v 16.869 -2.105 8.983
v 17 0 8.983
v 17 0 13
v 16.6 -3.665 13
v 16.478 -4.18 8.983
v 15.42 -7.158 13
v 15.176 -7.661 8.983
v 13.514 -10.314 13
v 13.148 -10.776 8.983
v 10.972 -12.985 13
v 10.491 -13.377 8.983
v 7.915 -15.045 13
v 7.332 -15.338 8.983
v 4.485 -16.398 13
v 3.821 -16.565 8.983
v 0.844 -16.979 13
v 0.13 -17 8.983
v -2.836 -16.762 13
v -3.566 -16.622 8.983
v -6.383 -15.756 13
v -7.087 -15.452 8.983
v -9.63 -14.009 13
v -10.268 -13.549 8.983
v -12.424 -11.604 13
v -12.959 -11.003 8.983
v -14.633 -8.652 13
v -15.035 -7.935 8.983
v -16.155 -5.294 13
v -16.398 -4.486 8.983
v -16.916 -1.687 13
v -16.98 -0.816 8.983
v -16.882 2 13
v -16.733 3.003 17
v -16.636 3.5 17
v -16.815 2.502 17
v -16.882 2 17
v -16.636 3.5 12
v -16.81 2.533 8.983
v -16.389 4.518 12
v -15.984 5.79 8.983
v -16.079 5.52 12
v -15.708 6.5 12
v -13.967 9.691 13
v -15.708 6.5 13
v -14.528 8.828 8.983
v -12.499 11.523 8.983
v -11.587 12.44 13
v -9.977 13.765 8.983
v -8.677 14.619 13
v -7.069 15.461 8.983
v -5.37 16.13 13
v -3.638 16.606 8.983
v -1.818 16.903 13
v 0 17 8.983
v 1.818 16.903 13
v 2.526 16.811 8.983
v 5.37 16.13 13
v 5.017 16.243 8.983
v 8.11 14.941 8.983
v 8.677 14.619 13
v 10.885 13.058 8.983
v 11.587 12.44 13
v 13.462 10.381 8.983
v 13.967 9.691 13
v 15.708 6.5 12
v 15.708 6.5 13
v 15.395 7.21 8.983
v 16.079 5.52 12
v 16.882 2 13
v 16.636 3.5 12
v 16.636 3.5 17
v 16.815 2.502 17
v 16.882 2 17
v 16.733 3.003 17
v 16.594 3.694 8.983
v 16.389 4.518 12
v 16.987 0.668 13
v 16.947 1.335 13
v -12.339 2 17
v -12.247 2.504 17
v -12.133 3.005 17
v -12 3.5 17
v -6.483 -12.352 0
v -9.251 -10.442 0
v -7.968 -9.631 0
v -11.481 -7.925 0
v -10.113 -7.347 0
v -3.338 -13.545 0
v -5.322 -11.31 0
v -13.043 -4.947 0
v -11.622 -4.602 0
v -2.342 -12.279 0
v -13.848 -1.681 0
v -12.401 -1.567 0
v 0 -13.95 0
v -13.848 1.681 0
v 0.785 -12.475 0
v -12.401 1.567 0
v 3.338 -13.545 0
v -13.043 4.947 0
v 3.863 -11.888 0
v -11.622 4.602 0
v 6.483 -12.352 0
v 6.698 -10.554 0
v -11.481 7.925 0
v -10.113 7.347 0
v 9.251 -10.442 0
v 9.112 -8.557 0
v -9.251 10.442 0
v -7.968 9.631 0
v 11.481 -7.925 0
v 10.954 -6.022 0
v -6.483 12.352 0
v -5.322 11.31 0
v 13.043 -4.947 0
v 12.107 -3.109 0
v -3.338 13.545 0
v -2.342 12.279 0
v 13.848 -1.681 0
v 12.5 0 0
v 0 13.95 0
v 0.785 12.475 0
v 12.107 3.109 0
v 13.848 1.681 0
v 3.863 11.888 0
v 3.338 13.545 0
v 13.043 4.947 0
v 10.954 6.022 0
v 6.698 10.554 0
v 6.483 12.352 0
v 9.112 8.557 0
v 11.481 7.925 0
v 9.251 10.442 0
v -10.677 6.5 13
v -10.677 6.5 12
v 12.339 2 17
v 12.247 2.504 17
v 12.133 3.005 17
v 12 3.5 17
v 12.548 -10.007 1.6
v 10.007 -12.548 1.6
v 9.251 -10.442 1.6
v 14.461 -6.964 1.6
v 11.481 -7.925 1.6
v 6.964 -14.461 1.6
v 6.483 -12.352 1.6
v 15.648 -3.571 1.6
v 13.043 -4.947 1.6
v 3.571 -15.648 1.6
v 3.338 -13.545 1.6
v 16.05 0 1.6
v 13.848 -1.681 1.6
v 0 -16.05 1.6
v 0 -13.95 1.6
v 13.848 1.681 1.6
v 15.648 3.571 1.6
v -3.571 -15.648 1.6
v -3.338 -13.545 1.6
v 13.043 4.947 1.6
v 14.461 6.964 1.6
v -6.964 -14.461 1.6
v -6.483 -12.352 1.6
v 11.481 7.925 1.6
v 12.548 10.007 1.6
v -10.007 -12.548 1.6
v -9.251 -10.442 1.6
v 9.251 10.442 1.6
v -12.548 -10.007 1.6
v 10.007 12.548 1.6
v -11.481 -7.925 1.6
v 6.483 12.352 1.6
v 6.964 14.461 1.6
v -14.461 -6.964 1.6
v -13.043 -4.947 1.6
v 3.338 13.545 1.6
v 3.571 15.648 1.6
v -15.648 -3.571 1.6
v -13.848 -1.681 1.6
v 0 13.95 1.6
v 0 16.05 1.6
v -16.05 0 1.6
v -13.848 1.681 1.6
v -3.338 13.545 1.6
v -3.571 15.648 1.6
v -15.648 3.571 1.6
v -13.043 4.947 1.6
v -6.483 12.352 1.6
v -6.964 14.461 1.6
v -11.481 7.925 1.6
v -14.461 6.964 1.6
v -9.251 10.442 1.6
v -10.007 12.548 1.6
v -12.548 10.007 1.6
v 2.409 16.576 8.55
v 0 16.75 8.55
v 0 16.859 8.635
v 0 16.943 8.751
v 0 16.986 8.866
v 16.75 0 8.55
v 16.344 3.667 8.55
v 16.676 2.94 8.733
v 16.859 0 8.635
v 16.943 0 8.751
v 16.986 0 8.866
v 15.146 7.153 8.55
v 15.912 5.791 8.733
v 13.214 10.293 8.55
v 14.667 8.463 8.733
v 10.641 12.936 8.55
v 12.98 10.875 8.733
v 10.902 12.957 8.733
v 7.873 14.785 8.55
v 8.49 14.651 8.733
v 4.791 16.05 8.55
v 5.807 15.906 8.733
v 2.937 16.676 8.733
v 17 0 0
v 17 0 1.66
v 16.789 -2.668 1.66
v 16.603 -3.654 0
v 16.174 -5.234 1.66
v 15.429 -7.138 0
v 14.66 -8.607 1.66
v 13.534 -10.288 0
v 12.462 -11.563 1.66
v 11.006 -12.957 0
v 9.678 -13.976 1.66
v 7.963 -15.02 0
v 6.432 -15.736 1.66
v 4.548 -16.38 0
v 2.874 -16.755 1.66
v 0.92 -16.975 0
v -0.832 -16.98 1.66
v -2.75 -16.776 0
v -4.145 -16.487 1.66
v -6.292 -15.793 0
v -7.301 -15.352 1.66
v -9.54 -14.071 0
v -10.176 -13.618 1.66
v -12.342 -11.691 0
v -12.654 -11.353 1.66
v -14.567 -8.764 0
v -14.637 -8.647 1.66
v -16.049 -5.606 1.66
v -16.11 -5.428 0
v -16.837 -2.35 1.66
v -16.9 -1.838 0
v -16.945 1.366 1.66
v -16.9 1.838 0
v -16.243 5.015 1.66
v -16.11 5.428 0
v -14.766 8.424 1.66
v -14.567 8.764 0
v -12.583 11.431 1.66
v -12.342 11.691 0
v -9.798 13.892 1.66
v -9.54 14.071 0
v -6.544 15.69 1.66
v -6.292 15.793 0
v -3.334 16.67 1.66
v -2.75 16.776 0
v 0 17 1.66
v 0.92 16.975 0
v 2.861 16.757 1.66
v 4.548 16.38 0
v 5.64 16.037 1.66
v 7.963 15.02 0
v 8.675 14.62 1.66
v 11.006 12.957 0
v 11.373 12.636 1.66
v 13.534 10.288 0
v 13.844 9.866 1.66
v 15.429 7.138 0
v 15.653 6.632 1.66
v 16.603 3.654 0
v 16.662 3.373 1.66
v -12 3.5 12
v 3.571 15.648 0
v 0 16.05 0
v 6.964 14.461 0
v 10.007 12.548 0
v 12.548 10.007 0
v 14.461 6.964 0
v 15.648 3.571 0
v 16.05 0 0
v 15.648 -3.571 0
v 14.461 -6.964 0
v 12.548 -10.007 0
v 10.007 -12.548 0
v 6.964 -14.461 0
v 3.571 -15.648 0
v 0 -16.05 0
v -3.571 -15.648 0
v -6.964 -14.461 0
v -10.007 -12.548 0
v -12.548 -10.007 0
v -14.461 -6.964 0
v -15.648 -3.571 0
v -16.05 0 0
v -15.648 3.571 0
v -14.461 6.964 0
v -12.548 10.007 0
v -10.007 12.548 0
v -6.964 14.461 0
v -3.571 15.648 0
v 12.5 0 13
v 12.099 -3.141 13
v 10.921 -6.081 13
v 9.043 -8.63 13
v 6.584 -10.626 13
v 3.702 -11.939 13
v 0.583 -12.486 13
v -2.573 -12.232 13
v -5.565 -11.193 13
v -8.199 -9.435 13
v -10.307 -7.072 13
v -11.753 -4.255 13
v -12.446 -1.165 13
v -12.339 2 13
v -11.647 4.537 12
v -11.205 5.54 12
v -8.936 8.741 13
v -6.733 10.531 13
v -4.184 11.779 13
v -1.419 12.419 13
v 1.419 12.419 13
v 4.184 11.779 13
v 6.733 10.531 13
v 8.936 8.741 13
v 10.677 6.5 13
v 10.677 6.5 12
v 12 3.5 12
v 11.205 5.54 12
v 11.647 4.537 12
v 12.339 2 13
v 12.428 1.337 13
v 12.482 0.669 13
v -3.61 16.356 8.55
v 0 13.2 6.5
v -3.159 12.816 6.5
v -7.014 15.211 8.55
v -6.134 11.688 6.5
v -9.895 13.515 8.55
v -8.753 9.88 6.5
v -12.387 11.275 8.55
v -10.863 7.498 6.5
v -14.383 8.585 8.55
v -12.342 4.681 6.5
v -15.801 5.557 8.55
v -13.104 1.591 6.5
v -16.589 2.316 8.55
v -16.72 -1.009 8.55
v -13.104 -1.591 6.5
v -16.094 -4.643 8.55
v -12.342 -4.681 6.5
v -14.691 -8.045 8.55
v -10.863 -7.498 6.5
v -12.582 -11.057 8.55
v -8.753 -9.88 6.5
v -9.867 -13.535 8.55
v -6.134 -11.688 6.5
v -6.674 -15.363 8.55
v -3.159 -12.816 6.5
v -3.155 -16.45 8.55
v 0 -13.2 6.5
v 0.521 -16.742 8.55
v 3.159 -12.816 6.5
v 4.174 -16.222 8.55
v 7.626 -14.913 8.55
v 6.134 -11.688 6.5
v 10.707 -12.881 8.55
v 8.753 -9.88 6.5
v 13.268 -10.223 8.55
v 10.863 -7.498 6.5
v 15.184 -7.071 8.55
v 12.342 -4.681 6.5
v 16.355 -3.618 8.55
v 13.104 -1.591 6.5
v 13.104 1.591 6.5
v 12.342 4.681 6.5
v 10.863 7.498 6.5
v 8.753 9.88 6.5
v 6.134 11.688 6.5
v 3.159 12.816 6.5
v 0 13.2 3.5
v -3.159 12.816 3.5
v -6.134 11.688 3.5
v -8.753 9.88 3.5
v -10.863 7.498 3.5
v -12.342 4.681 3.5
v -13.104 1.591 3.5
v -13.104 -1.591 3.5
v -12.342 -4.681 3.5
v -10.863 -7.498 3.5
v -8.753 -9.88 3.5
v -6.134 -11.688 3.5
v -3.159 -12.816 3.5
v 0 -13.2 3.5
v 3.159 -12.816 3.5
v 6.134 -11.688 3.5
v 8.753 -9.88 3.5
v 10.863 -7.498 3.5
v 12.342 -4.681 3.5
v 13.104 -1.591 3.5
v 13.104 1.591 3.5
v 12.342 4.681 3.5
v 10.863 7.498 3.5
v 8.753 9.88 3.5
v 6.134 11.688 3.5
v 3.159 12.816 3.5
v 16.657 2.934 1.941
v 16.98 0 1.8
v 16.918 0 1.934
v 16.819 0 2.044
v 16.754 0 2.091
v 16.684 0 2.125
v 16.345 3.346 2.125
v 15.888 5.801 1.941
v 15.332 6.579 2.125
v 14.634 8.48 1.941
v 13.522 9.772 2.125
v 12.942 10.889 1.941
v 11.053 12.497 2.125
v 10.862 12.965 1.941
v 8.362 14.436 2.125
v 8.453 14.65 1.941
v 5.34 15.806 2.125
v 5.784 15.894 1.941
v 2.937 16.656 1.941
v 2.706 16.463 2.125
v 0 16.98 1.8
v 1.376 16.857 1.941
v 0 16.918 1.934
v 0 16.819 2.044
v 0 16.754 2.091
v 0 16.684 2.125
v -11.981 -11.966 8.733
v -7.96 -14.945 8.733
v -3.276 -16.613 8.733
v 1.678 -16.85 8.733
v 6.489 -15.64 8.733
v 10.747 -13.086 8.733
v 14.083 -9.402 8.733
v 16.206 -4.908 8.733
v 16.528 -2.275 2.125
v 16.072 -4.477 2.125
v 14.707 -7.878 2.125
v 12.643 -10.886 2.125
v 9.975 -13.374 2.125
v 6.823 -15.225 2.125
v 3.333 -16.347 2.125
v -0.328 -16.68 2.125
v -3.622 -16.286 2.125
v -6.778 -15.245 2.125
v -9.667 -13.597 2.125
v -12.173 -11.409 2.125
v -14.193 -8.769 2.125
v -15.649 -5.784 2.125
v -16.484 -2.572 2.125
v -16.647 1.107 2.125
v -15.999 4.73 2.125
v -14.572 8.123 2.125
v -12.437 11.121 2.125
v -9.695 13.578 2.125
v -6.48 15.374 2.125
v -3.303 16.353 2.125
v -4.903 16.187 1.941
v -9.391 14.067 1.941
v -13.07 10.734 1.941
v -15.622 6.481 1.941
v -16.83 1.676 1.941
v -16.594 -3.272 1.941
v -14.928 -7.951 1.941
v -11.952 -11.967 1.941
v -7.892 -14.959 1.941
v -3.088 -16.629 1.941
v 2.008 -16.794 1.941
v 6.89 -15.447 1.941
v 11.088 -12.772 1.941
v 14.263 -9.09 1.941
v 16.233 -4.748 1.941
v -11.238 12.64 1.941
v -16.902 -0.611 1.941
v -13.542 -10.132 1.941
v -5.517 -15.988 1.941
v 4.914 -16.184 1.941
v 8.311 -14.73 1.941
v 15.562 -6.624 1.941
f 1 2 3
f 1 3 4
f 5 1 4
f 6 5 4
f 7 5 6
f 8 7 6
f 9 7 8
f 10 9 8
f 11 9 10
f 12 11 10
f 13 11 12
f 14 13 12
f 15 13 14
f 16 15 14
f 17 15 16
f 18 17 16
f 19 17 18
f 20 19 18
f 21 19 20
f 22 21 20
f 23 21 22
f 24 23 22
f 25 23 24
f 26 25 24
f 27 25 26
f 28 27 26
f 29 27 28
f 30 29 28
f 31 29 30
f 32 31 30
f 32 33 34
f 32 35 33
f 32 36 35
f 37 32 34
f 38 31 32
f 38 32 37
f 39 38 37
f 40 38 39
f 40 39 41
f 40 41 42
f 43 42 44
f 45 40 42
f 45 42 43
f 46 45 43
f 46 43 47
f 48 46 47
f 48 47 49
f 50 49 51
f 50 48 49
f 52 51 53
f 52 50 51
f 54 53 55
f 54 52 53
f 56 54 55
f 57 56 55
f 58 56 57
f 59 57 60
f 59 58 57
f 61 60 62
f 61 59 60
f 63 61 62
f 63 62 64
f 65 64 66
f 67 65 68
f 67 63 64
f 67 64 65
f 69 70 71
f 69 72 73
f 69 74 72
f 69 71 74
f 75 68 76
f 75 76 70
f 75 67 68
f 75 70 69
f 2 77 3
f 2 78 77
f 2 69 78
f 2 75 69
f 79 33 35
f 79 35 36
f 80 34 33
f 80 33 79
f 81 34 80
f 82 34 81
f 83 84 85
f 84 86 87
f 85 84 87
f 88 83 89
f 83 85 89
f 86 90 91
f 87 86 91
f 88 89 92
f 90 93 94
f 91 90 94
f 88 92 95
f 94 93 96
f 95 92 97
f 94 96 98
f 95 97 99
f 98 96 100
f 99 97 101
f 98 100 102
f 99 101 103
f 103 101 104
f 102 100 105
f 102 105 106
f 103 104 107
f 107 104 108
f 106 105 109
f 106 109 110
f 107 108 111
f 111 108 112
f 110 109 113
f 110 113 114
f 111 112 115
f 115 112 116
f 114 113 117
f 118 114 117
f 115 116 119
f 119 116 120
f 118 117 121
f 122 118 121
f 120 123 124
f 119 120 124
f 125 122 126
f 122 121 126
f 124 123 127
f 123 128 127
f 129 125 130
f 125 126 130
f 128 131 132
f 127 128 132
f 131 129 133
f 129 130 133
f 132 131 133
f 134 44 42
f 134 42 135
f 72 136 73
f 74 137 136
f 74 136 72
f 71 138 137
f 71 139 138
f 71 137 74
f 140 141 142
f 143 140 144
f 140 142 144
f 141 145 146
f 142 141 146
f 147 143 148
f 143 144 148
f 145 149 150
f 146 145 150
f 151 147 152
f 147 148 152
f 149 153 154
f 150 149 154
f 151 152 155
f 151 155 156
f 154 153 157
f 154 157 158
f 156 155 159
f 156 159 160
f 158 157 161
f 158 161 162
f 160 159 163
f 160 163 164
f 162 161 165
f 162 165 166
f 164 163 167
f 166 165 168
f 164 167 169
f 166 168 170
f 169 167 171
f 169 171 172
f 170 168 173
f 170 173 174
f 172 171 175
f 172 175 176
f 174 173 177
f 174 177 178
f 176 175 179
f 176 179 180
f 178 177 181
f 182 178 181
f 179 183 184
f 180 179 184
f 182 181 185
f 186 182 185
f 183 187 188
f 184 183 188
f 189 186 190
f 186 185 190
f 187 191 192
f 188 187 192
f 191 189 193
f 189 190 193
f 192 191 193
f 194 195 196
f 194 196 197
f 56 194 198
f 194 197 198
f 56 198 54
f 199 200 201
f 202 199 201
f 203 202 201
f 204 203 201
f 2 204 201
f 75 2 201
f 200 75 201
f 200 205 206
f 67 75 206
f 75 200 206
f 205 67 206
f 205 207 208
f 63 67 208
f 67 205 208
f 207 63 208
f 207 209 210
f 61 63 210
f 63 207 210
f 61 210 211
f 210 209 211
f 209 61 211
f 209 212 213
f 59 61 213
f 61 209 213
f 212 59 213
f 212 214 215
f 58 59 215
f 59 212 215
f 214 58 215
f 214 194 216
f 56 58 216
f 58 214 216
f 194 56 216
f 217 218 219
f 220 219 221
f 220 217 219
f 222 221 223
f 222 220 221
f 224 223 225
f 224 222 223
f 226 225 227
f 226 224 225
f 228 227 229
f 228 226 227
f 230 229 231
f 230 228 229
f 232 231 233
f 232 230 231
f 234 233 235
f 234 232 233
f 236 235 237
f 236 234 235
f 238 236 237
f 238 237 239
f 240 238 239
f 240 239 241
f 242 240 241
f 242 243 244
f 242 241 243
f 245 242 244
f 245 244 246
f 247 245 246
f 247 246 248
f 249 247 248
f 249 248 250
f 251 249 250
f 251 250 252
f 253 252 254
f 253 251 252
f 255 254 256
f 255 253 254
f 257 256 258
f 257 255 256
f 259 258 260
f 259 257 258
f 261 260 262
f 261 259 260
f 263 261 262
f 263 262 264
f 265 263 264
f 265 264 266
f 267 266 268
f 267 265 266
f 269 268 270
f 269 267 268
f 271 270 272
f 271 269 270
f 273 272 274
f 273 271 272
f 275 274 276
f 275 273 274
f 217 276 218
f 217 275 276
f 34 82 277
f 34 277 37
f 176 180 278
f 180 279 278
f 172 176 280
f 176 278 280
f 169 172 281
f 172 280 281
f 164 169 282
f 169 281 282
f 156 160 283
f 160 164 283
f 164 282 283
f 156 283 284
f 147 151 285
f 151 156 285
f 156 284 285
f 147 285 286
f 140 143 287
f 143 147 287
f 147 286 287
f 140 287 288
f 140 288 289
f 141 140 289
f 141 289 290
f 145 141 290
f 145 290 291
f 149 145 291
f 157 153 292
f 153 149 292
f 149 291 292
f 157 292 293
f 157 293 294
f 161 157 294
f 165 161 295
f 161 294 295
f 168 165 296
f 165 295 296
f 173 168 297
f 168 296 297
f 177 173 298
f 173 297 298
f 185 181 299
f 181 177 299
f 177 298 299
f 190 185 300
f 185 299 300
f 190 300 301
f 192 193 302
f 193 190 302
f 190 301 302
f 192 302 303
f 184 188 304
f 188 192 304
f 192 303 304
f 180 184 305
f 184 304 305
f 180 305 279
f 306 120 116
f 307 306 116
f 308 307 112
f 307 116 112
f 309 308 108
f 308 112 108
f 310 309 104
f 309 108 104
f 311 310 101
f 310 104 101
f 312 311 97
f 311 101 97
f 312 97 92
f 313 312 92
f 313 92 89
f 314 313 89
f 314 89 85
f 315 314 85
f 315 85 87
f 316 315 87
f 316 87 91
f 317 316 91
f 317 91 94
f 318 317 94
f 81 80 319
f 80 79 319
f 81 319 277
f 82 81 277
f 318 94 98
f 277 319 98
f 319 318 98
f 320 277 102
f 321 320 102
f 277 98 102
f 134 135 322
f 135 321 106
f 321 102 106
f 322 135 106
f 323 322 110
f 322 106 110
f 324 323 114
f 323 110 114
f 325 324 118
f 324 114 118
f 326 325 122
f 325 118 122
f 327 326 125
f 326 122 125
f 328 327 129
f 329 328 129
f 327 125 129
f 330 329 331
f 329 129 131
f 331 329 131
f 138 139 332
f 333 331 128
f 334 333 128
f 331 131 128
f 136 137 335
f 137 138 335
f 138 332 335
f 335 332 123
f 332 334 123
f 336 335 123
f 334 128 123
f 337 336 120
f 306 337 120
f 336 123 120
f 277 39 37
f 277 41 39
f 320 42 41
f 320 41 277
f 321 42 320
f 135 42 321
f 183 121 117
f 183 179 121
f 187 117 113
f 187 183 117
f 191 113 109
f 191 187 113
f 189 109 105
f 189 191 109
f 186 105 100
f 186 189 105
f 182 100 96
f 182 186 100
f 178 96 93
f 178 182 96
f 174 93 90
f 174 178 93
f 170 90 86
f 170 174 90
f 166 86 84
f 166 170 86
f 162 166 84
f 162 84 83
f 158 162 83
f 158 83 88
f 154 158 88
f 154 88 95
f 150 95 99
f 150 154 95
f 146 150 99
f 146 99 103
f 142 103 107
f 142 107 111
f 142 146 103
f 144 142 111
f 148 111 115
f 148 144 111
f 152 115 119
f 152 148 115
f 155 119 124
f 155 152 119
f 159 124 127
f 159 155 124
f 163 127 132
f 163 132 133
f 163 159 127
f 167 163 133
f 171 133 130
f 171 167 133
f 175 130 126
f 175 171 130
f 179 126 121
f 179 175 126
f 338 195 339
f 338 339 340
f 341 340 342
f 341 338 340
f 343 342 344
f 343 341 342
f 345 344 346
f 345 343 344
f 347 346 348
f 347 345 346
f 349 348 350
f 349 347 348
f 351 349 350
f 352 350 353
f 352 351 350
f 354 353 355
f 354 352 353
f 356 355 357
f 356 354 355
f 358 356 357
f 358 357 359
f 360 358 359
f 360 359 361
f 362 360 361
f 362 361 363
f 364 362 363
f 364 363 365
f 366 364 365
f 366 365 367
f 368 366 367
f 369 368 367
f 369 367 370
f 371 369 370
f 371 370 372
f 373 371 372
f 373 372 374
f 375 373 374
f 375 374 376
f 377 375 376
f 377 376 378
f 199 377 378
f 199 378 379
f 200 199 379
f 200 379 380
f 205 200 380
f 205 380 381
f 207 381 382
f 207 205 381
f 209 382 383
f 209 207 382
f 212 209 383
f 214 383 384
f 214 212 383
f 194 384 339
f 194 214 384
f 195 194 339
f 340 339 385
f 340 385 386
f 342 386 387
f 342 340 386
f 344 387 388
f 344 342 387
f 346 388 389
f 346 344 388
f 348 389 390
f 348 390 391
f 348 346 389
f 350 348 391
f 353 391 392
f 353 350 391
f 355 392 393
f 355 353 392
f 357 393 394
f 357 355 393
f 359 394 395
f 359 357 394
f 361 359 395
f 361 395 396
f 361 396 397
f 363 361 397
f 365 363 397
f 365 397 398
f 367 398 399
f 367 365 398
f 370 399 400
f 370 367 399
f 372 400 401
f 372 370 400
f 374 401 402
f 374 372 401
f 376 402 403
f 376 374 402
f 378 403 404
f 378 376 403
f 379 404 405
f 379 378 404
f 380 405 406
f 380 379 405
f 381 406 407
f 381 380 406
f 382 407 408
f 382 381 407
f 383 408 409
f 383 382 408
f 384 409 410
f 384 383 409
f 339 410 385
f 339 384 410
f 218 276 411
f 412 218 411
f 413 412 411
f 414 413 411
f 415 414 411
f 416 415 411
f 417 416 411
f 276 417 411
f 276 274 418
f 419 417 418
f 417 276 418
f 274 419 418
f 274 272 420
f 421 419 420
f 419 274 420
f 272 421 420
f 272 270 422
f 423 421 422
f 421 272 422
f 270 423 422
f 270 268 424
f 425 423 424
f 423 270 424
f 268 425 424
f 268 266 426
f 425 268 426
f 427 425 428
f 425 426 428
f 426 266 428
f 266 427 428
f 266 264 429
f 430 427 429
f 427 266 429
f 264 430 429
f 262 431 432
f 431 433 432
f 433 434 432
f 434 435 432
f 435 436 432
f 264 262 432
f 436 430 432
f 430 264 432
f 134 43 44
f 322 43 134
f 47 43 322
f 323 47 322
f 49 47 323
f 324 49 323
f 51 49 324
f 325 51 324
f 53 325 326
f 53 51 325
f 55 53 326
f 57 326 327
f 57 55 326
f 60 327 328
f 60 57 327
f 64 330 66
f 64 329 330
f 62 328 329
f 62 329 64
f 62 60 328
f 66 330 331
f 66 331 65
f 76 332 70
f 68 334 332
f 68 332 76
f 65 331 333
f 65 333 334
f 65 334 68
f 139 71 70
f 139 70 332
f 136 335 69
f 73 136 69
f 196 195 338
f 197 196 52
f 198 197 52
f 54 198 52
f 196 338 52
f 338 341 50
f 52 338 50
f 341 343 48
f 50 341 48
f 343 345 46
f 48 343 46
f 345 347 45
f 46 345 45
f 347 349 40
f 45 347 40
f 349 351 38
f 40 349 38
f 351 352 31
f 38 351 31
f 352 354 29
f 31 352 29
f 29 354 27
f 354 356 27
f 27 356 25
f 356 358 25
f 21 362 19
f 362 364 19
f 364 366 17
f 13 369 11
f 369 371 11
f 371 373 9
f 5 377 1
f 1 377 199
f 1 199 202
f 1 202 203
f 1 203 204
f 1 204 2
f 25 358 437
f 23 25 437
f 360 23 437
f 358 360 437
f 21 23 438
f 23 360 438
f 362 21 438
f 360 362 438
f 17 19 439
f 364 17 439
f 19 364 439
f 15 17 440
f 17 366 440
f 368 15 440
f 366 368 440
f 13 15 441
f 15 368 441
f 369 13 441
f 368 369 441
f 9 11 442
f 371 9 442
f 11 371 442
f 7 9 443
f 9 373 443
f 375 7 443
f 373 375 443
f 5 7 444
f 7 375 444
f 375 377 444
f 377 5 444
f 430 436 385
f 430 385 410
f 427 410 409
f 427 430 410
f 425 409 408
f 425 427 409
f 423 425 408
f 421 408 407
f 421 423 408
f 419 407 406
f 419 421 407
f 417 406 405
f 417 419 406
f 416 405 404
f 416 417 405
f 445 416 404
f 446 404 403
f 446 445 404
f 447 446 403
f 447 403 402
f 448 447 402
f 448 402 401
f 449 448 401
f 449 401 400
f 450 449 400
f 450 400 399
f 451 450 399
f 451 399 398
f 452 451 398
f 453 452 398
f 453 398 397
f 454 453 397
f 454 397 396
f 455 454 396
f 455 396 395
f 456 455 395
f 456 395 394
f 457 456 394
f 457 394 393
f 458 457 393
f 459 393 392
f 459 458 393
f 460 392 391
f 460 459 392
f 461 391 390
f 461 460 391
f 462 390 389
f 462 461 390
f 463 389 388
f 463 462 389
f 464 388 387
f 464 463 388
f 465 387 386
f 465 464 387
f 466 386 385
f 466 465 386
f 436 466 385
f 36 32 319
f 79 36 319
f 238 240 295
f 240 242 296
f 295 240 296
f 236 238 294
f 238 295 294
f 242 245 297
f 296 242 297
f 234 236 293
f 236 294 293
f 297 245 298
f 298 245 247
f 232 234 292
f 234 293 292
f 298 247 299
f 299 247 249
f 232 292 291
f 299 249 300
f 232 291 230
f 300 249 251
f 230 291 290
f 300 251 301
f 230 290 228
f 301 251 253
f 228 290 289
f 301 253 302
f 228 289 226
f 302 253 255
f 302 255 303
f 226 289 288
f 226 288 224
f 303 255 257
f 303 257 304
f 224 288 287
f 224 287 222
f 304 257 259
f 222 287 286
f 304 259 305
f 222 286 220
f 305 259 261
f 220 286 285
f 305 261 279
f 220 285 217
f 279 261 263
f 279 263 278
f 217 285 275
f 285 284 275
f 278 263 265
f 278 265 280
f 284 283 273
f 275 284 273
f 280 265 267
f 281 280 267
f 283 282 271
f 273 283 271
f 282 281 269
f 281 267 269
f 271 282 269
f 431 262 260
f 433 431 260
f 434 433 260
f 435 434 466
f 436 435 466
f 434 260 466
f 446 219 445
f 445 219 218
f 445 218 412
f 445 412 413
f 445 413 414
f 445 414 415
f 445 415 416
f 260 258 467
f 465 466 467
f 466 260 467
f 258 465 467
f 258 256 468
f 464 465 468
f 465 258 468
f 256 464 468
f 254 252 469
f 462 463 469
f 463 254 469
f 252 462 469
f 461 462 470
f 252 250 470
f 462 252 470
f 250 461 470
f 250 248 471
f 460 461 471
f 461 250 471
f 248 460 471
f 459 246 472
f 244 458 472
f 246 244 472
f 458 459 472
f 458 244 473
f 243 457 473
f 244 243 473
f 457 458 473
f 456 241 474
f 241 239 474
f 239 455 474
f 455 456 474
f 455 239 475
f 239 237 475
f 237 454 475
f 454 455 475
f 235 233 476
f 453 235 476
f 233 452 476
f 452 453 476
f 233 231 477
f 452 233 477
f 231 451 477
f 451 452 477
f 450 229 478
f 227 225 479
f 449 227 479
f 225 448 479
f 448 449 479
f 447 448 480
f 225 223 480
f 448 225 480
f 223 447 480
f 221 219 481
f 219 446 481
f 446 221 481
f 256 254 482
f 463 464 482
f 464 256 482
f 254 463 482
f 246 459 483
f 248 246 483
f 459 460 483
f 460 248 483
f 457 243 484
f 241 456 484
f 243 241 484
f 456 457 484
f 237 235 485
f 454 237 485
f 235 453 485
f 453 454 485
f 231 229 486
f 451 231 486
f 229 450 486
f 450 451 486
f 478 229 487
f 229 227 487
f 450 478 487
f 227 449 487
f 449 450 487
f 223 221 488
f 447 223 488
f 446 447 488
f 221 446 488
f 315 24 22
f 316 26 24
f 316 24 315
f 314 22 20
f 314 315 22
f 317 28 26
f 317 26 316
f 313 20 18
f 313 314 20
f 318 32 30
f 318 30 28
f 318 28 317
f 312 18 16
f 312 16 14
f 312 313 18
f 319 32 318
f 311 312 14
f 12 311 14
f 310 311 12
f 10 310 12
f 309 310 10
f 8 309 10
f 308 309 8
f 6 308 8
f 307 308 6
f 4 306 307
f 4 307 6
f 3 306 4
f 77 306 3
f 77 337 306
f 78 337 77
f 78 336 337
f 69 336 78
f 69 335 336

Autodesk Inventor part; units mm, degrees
ref_plane "YZ Plane" through (0, 0, 0) normal (1, 0, 0) x (0, 1, 0)
ref_plane "XZ Plane" through (0, 0, 0) normal (0, 1, 0) x (-1, 0, 0)
ref_plane "XY Plane" through (0, 0, 0) normal (0, 0, 1) x (1, 0, 0)
sketch "Náčrt1" plane through (0, 0, 0) normal (0, 0, 1) x (1, 0, 0)
  circle A0 centre (0, 0) radius 17
  circle A1 centre (0, 0) radius 12.5
  line L0 (-2.5, -12.5) -> (2.5, -12.5)
  line L1 (2.5, -12.5) -> (2.5, 12.5)
  line L2 (2.5, 12.5) -> (-2.5, 12.5)
  line L3 (-2.5, 12.5) -> (-2.5, -12.5)
  line L4 (-2.5, -12.5) -> (2.5, 12.5) construction
  line L5 (2.5, -12.5) -> (-2.5, 12.5) construction
  line L6 (-12.5, -2.5) -> (12.5, -2.5)
  line L7 (12.5, -2.5) -> (12.5, 2.5)
  line L8 (12.5, 2.5) -> (-12.5, 2.5)
  line L9 (-12.5, 2.5) -> (-12.5, -2.5)
  line L10 (-12.5, -2.5) -> (12.5, 2.5) construction
  line L11 (12.5, -2.5) -> (-12.5, 2.5) construction
  dimension "d0" = 34
  dimension "d3" = 25
  dimension "d29" = 5
  dimension "d30" = 25
  dimension "d31" = 25
  dimension "d32" = 5
extrude "Vysunutí1" add sketch "Náčrt1" along normal blind 13 contours A0 | L7 L6 A1 | A1 L8 L7 | A1 L2 L1 | L1 L0 A1 | A1 L3 L2 | L0 L3 A1 | A1 L9 L8 | L6 L9 A1
sketch "Náčrt2" plane through (0, 0, 0) normal (1, 0, 0) x (0, 1, 0)
  line L0 (17, 0) -> (-17, 0) projected
  line L1 (17, 13) -> (-17, 13) projected
  line L2 (17, 0) -> (-17, 0) projected
  line L3 (-12.5, 13) -> (12.5, 13) projected
  line L4 (-12.5, 0) -> (12.5, 0) projected
  line L5 (17, 0) -> (17, 13) projected
  line L6 (12.5, 13) -> (12.5, 0) projected
  line L7 (0, -4.52) -> (0, 15.92) projected
  line L8 (16.05, -1.6) -> (13.95, -1.6)
  line L9 (13.95, -1.6) -> (13.95, 1.6)
  line L10 (13.95, 1.6) -> (16.05, 1.6)
  line L11 (16.05, 1.6) -> (16.05, -1.6)
  line L12 (16.05, -1.6) -> (13.95, 1.6) construction
  line L13 (13.95, -1.6) -> (16.05, 1.6) construction
  point P0 (0, 0)
  point P1 (15, 0)
  point P2 (13.95, 0)
  point P3 (16.05, 0)
  dimension "d36" = 2.1
  dimension "d37" = 1.6
  dimension "d38" = 2
  dimension "d39" = 2.5
revolve "Rotace1" cut sketch "Náčrt2" angle 360 about axis through (0, 0, -10) along (0, 0, 1) contours L0 L9 L10 L11
sketch "Náčrt4" plane through (0, 0, 13) normal (0, 0, 1) x (1, 0, 0)
  line L0 (-17, 6.5) -> (17, 6.5)
  line L1 (17, 6.5) -> (17, 3.5)
  line L2 (17, 3.5) -> (-17, 3.5)
  line L3 (-17, 3.5) -> (-17, 6.5)
  line L4 (-17, 6.5) -> (17, 3.5) construction
  line L5 (17, 6.5) -> (-17, 3.5) construction
  point P0 (0, 0)
  point P1 (0, 5)
  dimension "d9" = 3
  dimension "d10" = 34
  dimension "d11" = 5
extrude "Vysunutí2" cut sketch "Náčrt4" against normal blind 1
sketch "Náčrt5" plane through (0, 0, 0) normal (1, 0, 0) x (0, 1, 0)
  line L0 (17, 0) -> (17, 13) projected
  line L1 (17, 2) -> (13.2, 3.5)
  line L2 (17, 2) -> (21.0853, 2) construction
  line L3 (17, 0) -> (-17, 0) projected
  line L4 (13.2, 3.5) -> (13.2, 6.5)
  line L5 (17, 2) -> (17, 8.6939)
  line L6 (17, 8.6939) -> (13.2, 6.5)
  line L7 (0, -2.6) -> (0, 15.6) projected
  point P0 (0, 0)
  point P1 (0, 0)
  dimension "d15" = 2
  dimension "d16" = 13.2
  dimension "d17" = 60
  dimension "d20" = 3.5
  dimension "d21" = 68.459
  dimension "d22" = 3
revolve "Rotace2" cut sketch "Náčrt5" angle 360 about axis through (0, 0, -10) along (0, 0, 1)
fillet "Zaoblení1" radius 0.5 4 edges at (12.0208, 12.0208, 8.6939) (-12.0208, -12.0208, 8.6939) (-12.0208, -12.0208, 2) (12.0208, 12.0208, 2)
sketch "Náčrt6" plane through (0, 0, 13) normal (0, 0, 1) x (1, 0, 0)
  circle A0 centre (0, 0) radius 17
  circle A1 centre (0, 0) radius 12.5
  line L0 (17.5, -2) -> (-17.5, -2)
  line L1 (-17.5, -2) -> (-17.5, 2)
  line L2 (-17.5, 2) -> (17.5, 2)
  line L3 (17.5, 2) -> (17.5, -2)
  line L4 (17.5, -2) -> (-17.5, 2) construction
  line L5 (-17.5, -2) -> (17.5, 2) construction
  line L6 (17.5, -3.5) -> (-17.5, -3.5)
  line L7 (-17.5, -3.5) -> (-17.5, 3.5)
  line L8 (-17.5, 3.5) -> (17.5, 3.5)
  line L9 (17.5, 3.5) -> (17.5, -3.5)
  line L10 (17.5, -3.5) -> (-17.5, 3.5) construction
  line L11 (-17.5, -3.5) -> (17.5, 3.5) construction
  point P0 (12, 3.5)
  point P1 (16.6358, 3.5)
  point P2 (16.8819, 2)
  point P3 (12.339, 2)
  point P4 (-16.6358, 3.5)
  point P5 (-12, 3.5)
  point P6 (-12.339, 2)
  point P7 (-16.8819, 2)
  point P8 (-16.6358, 3.5)
  dimension "d23" = 35
  dimension "d25" = 35
  dimension "d26" = 4
  dimension "d33" = 7
extrude "Vysunutí4" add sketch "Náčrt6" along normal blind 4 contours L2 A1 L8 A0 | L8 A1 L2 A0
properties part number "sonar_3D tisk"
